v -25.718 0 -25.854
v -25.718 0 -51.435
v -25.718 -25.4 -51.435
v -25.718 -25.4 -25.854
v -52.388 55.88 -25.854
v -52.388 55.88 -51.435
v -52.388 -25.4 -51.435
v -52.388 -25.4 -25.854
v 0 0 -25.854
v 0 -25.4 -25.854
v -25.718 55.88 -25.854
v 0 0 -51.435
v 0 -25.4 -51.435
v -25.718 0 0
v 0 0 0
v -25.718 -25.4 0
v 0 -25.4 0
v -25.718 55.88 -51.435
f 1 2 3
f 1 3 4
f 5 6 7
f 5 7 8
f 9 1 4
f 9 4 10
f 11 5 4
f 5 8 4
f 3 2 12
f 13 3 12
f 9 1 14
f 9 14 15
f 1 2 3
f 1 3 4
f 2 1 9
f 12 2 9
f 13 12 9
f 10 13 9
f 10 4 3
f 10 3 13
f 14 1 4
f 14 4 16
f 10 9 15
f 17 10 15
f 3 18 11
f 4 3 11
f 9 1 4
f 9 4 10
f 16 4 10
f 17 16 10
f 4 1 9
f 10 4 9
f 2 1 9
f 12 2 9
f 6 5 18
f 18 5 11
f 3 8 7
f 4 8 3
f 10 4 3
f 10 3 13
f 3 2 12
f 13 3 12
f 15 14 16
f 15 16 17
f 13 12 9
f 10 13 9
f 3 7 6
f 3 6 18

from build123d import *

# Parameters (mm, degrees)
F0_W     = 25.7175005972
F0_H     = 25.8535724133
F1_DEPTH = 25.4
F0_W_2   = 26.6700014472
F0_H_2   = 25.5814287812
F2_DEPTH = 25.4
F3_DEPTH = 25.4
F4_DEPTH = 25.4
F5_DEPTH = 55.88


with BuildPart() as f1:
    # F0 (on Front) → F1 (new body)
    with BuildSketch(Plane.XZ):
        with Locations((-12.8587502986, -12.9267862067)):
            Rectangle(F0_W, F0_H)
    extrude(amount=F1_DEPTH)


with BuildPart() as f2:
    # F0 (on Front) → F2 (new body)
    with BuildSketch(Plane.XZ):
        with Locations((-39.0525013208, -38.6442868039)):
            Rectangle(F0_W_2, F0_H_2)
    extrude(amount=F2_DEPTH)

    # F0 (on Front) → F5 (join)
    with BuildSketch(Plane.XZ):
        with Locations((-39.0525013208, -38.6442868039)):
            Rectangle(F0_W_2, F0_H_2)
    extrude(amount=-F5_DEPTH)


with BuildPart() as f3:
    # F0 (on Front) → F3 (new body)
    with BuildSketch(Plane.XZ):
        with Locations((-12.8587502986, -38.6442868039)):
            Rectangle(F0_W, F0_H_2)
    extrude(amount=F3_DEPTH)


with BuildPart() as f4:
    # F0 (on Front) → F4 (new body)
    with BuildSketch(Plane.XZ):
        with Locations((-12.8587502986, -38.6442868039)):
            Rectangle(F0_W, F0_H_2)
    extrude(amount=F4_DEPTH)


solid = Compound([f1.part, f2.part, f3.part, f4.part])
